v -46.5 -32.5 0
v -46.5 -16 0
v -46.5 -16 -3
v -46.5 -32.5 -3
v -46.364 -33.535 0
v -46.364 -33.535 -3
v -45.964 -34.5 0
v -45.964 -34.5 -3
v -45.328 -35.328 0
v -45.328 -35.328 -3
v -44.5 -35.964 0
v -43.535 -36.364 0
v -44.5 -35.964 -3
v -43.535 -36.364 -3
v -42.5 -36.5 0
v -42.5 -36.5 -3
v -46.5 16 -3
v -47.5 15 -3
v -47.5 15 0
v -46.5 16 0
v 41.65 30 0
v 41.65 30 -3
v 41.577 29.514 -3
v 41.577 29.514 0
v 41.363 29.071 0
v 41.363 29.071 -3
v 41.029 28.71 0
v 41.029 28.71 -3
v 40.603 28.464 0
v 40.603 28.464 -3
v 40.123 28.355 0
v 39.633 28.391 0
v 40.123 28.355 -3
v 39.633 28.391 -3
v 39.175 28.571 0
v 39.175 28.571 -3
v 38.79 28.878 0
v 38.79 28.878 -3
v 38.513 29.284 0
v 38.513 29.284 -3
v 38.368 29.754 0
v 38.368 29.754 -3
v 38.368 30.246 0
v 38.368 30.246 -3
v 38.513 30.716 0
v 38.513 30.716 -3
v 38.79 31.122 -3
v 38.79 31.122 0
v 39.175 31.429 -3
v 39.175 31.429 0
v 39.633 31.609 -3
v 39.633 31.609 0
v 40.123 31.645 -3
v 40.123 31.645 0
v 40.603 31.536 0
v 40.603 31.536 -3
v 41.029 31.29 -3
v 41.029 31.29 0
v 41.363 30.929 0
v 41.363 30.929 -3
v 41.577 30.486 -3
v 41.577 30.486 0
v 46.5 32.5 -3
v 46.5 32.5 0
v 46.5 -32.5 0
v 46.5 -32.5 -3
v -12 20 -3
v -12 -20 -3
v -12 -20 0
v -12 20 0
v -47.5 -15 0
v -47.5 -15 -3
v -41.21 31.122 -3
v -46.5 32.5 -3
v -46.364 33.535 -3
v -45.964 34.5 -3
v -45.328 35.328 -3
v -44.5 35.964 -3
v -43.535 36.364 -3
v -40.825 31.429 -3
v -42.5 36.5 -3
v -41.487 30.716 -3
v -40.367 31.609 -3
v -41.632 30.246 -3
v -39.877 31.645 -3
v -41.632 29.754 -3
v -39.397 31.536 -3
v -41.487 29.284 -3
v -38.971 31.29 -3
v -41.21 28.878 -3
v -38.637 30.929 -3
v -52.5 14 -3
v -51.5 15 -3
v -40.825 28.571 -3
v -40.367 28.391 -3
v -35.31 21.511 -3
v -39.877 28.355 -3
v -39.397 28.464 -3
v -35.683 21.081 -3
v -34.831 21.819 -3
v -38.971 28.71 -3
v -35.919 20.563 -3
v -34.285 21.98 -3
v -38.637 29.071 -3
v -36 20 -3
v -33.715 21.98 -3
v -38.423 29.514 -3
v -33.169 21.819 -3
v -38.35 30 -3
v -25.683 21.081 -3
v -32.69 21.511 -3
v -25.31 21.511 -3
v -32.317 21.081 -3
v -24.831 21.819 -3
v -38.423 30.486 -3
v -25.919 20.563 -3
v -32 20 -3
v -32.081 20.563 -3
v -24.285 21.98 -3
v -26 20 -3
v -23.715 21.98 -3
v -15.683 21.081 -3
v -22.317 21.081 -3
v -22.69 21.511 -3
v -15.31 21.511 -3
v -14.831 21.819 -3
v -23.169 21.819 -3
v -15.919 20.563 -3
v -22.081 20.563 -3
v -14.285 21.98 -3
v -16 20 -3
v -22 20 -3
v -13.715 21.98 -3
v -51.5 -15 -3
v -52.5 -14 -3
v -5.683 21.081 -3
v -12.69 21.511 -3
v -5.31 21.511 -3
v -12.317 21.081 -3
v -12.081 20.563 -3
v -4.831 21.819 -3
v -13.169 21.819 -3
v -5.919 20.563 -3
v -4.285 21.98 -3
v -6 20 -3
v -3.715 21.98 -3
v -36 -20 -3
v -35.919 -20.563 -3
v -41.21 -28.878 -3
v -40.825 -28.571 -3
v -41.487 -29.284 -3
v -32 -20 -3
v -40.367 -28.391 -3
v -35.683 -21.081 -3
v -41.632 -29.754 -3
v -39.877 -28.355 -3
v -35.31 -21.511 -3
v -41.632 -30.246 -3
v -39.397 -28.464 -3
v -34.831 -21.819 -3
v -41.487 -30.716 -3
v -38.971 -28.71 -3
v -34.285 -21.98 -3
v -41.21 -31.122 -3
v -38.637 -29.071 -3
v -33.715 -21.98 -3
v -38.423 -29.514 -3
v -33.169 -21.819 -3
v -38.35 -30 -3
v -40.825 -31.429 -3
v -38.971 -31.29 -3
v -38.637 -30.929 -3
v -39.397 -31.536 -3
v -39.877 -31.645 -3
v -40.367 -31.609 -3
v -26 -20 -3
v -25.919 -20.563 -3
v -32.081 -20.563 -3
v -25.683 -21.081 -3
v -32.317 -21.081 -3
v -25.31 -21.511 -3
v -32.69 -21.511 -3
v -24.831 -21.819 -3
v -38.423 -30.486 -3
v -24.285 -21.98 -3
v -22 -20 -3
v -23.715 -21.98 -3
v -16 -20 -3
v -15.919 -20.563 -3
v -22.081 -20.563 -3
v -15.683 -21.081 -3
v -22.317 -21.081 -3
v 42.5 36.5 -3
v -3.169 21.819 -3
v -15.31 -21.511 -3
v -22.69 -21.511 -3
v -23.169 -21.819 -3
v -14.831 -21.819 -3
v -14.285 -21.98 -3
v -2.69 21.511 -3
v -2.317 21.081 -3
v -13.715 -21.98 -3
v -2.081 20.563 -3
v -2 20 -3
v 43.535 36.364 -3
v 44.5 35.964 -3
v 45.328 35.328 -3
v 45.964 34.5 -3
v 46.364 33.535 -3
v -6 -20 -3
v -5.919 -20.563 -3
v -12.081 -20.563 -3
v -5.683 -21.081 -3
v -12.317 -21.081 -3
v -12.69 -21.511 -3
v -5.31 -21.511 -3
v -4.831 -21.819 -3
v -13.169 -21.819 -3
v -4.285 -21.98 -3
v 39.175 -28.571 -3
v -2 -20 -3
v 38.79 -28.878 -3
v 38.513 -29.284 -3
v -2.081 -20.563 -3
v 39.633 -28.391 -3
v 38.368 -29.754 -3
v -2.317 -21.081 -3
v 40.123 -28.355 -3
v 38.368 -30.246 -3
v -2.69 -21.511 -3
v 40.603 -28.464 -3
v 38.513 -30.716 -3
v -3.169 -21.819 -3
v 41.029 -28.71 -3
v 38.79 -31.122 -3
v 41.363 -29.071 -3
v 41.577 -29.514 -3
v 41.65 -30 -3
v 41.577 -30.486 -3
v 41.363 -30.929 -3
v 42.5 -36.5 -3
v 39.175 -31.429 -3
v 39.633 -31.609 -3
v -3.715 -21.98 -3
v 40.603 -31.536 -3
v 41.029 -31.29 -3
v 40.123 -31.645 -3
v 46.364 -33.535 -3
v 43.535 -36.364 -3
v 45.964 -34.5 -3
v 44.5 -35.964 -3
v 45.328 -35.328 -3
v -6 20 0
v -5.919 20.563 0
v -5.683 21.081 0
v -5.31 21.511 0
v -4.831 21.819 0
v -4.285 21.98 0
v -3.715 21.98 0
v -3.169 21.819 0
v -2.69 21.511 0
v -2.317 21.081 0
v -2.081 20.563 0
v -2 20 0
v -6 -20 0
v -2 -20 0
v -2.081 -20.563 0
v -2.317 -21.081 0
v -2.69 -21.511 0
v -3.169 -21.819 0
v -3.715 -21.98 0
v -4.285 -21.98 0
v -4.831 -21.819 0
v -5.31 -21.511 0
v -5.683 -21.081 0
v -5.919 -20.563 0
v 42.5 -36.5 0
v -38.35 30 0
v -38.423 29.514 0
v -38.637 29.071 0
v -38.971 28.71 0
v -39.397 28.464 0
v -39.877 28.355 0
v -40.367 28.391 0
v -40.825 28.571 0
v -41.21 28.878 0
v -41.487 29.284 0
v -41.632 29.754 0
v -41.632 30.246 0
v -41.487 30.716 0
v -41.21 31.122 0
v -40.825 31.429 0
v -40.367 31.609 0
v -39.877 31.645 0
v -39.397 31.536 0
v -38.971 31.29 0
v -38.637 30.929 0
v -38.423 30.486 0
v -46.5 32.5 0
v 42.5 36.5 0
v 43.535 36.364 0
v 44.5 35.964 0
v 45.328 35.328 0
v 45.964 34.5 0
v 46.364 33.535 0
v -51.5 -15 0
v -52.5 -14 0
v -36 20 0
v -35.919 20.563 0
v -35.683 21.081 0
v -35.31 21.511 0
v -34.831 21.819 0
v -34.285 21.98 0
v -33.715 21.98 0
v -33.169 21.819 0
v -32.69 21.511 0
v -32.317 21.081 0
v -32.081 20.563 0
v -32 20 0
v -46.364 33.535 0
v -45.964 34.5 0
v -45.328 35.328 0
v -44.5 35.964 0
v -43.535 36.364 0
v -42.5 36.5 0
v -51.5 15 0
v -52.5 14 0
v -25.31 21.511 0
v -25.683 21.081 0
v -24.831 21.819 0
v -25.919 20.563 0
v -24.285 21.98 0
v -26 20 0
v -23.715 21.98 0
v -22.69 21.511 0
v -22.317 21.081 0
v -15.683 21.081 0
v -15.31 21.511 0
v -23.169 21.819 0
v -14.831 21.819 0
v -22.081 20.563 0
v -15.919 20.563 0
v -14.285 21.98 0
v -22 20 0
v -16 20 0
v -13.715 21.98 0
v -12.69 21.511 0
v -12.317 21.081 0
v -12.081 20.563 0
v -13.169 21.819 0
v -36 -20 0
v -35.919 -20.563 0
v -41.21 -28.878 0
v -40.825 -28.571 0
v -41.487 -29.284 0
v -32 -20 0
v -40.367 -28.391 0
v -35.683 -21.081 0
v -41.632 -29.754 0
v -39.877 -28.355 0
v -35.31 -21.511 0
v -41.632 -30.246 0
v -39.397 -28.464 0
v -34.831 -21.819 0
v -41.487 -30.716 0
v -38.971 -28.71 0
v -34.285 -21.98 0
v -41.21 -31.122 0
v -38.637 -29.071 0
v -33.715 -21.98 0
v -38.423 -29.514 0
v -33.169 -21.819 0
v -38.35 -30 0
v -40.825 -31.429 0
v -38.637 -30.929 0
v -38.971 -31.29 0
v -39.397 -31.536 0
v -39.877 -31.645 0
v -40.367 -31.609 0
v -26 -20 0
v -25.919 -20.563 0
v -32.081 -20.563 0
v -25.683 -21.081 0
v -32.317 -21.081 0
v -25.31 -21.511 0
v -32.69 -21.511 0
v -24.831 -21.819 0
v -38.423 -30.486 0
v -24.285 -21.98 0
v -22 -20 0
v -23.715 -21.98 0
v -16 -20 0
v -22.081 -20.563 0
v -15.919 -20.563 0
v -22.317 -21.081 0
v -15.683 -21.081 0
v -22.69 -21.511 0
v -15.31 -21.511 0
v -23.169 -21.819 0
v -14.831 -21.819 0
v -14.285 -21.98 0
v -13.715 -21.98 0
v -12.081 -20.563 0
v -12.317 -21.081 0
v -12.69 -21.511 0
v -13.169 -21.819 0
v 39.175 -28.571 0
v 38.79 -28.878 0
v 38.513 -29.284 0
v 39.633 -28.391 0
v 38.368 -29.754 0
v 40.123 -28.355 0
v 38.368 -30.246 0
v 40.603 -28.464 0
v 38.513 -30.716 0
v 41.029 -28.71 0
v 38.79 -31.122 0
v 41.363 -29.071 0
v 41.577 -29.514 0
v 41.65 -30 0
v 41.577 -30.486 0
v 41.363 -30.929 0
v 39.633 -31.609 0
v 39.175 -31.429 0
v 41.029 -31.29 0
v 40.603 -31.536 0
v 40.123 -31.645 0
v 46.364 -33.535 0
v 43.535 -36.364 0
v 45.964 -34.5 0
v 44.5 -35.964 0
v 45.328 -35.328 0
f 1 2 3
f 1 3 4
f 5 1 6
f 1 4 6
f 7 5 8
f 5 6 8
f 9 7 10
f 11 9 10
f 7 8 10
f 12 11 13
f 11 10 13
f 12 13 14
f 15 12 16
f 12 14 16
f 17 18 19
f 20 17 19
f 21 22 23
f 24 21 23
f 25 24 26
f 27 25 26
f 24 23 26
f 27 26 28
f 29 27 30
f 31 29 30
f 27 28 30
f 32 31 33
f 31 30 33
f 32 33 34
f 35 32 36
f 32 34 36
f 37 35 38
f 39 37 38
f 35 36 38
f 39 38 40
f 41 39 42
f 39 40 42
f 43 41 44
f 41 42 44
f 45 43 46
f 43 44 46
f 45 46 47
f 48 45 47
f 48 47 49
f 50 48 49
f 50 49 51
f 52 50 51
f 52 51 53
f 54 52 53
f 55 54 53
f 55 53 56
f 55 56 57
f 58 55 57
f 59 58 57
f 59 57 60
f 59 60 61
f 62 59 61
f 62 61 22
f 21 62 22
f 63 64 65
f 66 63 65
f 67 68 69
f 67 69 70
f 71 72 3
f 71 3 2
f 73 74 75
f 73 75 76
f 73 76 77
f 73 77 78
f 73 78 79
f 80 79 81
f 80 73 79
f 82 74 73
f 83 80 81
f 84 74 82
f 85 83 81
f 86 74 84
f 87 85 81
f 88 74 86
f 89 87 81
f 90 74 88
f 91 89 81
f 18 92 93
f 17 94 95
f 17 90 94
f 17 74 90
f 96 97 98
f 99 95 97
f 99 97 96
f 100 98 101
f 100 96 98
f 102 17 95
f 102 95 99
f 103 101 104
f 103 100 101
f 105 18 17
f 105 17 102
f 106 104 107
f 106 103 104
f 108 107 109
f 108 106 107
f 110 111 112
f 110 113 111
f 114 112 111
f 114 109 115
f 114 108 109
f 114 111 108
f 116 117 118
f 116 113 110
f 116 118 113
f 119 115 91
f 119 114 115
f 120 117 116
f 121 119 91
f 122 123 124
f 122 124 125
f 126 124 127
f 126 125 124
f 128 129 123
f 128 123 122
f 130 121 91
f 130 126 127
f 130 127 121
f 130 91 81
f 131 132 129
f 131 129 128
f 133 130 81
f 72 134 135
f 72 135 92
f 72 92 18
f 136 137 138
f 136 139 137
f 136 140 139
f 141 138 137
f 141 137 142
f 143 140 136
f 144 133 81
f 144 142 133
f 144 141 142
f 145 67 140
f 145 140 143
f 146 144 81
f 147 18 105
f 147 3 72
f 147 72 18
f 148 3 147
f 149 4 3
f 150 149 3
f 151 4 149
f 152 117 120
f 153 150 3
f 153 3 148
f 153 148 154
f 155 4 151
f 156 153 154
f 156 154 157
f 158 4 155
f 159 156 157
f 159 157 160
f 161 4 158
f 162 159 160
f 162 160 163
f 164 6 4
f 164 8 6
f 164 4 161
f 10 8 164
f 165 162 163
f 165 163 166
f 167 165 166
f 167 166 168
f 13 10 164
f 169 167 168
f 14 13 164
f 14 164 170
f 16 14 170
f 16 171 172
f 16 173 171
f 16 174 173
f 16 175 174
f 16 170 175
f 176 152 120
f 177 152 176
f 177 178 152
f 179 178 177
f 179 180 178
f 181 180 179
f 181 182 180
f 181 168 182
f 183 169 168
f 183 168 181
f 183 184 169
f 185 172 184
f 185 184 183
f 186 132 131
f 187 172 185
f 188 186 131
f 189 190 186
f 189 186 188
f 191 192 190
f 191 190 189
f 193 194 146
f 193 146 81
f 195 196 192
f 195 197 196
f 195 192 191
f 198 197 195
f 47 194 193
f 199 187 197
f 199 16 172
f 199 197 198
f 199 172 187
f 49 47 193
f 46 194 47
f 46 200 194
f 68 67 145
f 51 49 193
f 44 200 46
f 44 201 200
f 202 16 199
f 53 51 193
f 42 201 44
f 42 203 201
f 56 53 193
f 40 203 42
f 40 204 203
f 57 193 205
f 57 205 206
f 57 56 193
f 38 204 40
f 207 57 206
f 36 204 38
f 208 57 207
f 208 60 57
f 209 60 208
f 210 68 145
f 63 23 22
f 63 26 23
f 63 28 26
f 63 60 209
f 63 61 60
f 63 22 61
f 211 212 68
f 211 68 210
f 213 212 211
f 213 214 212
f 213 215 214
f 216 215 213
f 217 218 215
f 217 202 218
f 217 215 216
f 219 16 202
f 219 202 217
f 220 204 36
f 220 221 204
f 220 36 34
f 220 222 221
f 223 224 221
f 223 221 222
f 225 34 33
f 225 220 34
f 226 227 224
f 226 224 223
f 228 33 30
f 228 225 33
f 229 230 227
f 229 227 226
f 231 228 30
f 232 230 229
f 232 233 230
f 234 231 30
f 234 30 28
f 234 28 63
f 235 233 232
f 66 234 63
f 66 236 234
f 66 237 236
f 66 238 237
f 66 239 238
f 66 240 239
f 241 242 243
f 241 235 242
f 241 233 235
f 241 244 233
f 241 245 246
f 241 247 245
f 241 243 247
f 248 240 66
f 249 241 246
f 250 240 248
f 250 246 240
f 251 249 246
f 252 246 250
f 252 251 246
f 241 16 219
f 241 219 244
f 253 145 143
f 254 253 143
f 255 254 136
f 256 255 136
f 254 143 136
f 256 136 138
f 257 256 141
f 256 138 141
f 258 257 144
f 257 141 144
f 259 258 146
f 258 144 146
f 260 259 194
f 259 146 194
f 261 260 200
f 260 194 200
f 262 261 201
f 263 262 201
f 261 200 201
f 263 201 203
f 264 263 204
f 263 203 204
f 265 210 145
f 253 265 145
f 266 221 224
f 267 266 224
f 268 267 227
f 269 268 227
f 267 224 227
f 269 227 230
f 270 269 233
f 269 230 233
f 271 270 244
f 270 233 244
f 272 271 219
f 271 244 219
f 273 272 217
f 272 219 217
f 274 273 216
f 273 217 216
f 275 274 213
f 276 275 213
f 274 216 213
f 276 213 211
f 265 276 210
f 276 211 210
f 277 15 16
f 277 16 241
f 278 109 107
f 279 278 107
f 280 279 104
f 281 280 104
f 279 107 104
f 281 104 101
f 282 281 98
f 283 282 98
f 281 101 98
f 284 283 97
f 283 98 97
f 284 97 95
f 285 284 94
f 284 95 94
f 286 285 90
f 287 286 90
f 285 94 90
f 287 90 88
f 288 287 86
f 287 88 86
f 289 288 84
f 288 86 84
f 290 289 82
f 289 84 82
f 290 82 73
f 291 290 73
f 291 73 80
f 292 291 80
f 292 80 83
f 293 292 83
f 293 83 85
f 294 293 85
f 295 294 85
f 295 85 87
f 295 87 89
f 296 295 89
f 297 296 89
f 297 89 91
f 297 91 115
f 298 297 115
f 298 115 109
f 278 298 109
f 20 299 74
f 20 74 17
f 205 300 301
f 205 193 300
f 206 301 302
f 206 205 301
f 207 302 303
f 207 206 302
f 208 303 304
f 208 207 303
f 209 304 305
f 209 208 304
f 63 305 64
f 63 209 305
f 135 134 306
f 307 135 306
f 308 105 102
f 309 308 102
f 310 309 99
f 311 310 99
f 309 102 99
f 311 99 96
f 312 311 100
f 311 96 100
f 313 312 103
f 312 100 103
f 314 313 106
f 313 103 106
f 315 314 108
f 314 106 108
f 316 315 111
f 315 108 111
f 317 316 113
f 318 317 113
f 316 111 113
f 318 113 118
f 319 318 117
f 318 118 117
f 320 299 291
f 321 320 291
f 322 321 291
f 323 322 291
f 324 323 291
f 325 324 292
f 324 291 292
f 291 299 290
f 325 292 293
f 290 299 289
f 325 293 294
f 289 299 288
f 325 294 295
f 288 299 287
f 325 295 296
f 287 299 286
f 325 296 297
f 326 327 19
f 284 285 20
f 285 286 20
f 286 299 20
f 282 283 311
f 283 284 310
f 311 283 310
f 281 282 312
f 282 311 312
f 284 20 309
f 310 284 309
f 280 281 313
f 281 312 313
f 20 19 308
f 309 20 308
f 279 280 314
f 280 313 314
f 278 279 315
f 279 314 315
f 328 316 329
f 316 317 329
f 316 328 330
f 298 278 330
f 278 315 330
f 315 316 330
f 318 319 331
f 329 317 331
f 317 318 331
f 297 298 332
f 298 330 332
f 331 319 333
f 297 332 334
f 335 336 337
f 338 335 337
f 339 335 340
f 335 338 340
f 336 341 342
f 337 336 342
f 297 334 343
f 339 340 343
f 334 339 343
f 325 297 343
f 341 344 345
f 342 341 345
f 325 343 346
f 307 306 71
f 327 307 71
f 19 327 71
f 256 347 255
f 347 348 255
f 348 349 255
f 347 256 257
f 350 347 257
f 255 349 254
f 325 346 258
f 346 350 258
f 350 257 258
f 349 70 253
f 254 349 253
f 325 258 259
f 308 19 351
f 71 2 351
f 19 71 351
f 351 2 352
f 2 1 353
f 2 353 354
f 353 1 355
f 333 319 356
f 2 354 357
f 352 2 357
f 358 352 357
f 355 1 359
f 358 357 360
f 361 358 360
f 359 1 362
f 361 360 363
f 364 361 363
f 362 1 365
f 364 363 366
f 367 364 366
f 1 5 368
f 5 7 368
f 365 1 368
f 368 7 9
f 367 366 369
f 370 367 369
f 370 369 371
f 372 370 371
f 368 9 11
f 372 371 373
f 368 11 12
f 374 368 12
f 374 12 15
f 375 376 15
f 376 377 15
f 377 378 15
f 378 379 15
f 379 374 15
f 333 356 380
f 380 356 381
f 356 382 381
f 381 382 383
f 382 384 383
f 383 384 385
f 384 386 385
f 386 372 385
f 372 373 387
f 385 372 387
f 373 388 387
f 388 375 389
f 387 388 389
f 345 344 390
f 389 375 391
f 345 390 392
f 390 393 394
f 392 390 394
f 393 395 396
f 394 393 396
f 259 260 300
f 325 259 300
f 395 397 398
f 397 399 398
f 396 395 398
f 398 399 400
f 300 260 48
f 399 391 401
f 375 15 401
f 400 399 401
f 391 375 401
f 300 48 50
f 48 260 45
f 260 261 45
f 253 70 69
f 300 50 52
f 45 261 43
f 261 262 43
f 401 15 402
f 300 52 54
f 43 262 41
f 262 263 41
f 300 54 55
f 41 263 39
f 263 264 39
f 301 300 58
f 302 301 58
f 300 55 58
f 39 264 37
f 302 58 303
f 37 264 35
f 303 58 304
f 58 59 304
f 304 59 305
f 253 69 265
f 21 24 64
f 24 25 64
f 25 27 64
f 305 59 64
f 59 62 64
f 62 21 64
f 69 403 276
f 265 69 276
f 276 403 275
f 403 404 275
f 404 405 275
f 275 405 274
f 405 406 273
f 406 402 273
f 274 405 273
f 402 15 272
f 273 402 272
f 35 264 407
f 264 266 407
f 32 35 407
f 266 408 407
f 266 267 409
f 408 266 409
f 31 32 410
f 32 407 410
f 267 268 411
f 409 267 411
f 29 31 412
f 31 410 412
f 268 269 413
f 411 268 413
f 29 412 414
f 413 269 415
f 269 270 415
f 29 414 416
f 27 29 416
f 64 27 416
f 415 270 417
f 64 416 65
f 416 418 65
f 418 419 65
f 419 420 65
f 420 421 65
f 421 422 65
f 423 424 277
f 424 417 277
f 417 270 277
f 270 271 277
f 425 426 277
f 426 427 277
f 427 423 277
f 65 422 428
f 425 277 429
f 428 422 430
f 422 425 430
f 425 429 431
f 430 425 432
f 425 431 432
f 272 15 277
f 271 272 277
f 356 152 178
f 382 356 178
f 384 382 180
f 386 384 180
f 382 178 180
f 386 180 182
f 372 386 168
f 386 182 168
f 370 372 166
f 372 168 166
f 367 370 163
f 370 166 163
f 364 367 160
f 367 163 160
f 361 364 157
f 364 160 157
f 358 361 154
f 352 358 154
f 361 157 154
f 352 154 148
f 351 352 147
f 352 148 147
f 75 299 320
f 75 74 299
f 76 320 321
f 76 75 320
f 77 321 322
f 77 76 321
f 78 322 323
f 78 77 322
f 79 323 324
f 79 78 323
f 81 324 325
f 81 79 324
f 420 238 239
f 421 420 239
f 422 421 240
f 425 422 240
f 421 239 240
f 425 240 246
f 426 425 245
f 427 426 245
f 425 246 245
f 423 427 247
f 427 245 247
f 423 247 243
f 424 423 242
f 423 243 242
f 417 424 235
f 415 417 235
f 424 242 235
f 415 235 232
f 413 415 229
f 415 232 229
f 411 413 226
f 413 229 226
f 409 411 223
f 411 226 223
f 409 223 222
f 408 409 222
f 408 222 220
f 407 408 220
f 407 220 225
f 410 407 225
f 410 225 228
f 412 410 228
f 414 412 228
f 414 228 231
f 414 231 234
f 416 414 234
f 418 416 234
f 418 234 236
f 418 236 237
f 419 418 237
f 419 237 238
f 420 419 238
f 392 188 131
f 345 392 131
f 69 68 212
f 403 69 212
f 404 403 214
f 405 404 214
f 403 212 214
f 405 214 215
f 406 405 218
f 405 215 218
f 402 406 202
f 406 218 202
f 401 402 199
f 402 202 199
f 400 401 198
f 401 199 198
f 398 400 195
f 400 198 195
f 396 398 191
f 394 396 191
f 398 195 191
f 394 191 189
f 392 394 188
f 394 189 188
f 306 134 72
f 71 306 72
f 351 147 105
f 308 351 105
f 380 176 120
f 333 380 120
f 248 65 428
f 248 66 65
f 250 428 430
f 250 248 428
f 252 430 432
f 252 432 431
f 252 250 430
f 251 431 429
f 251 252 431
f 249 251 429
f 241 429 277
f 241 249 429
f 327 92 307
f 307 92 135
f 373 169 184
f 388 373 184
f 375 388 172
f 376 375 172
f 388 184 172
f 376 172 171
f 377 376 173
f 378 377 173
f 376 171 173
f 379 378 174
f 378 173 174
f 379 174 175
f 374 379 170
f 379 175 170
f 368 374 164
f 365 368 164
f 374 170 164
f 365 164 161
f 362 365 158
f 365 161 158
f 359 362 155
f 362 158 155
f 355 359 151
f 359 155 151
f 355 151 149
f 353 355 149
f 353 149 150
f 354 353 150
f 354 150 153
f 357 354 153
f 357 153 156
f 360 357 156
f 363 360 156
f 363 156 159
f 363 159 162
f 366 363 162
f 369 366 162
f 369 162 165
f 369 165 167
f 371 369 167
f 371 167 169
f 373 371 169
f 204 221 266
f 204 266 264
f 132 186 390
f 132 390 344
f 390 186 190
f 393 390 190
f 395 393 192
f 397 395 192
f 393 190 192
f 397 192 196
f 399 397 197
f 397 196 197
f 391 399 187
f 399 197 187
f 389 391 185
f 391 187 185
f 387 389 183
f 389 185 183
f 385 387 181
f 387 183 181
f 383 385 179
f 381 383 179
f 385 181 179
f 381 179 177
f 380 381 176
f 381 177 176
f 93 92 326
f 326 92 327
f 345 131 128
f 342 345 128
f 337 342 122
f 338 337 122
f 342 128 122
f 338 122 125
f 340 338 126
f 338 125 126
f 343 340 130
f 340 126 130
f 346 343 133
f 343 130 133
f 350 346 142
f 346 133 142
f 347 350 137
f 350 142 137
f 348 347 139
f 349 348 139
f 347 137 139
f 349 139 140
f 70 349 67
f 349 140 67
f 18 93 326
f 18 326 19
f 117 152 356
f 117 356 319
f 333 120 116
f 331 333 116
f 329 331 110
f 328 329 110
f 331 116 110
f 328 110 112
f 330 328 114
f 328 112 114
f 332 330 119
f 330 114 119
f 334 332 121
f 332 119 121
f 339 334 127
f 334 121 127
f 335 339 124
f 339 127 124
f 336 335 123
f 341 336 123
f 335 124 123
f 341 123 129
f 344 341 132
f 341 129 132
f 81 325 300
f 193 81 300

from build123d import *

# Parameters (mm, degrees)
SKETCH064_W            = 93
SKETCH064_H            = 73
PAD021_DEPTH           = 3
FILLET016_R            = 4
SKETCH065_R            = 1.65
POCKET045_DEPTH        = 3.001
SKETCH069_W            = 6
SKETCH069_H            = 30
PAD023_DEPTH           = 3
CHAMFER016_SIZE        = 1
POCKET050_DEPTH        = 3.001
LINEARPATTERN001_COUNT = 4
LINEARPATTERN001_PITCH = 10


with BuildPart() as part:
    # Sketch064 (on Face1 of CopyMirrored003) → Pad021 (new body)
    with BuildSketch(Plane(origin=(0, 0, 0), x_dir=(1, 0, 0), z_dir=(0, 0, -1))):
        Rectangle(SKETCH064_W, SKETCH064_H)
    extrude(amount=PAD021_DEPTH)

    # Fillet016
    fillet016_edges = [part.edges().sort_by_distance(p)[0] for p in [
        (-46.5, 36.5, -1.5),
        (-46.5, -36.5, -1.5),
        (46.5, -36.5, -1.5),
        (46.5, 36.5, -1.5),
    ]]
    fillet(fillet016_edges, radius=FILLET016_R)

    # Sketch065 (on Face5 of Fillet016) → Pocket045 (cut, through all)
    with BuildSketch(Plane(origin=(0, 0, -3), x_dir=(1, 0, 0), z_dir=(0, 0, -1))):
        with Locations((-40, 30)):
            Circle(SKETCH065_R)
        with Locations((-40, -30)):
            Circle(SKETCH065_R)
        with Locations((40, 30)):
            Circle(SKETCH065_R)
        with Locations((40, -30)):
            Circle(SKETCH065_R)
    extrude(amount=-POCKET045_DEPTH, mode=Mode.SUBTRACT)

    # Sketch069 (on Face5 of Pocket045) → Pad023 (join)
    with BuildSketch(Plane(origin=(0, 0, -3), x_dir=(1, 0, 0), z_dir=(0, 0, -1))):
        with Locations((-49.5, 0)):
            Rectangle(SKETCH069_W, SKETCH069_H)
    extrude(amount=-PAD023_DEPTH)

    # Chamfer016
    chamfer016_edges = [part.edges().sort_by_distance(p)[0] for p in [
        (-52.5, 15, -1.5),
        (-52.5, -15, -1.5),
        (-46.5, -15, -1.5),
        (-46.5, 15, -1.5),
    ]]
    chamfer(chamfer016_edges, length=CHAMFER016_SIZE)

    # Sketch073 (on Face5 of Chamfer016) → Pocket050 (cut, through all)
    with BuildSketch(Plane(origin=(0, 0, -3), x_dir=(1, 0, 0), z_dir=(0, 0, -1))):
        with BuildLine():
            ThreePointArc((-32, 20), (-34, 22), (-36, 20))
            Line((-36, 20), (-36, -20))
            ThreePointArc((-36, -20), (-34, -22), (-32, -20))
            Line((-32, 20), (-32, -20))
        make_face()
    pocket050 = extrude(amount=-POCKET050_DEPTH, mode=Mode.SUBTRACT)

    # LinearPattern001: Pocket050 ×4
    with Locations(*[(i * LINEARPATTERN001_PITCH, 0, 0) for i in range(1, LINEARPATTERN001_COUNT)]):
        add(pocket050, mode=Mode.SUBTRACT)


solid = part.part
